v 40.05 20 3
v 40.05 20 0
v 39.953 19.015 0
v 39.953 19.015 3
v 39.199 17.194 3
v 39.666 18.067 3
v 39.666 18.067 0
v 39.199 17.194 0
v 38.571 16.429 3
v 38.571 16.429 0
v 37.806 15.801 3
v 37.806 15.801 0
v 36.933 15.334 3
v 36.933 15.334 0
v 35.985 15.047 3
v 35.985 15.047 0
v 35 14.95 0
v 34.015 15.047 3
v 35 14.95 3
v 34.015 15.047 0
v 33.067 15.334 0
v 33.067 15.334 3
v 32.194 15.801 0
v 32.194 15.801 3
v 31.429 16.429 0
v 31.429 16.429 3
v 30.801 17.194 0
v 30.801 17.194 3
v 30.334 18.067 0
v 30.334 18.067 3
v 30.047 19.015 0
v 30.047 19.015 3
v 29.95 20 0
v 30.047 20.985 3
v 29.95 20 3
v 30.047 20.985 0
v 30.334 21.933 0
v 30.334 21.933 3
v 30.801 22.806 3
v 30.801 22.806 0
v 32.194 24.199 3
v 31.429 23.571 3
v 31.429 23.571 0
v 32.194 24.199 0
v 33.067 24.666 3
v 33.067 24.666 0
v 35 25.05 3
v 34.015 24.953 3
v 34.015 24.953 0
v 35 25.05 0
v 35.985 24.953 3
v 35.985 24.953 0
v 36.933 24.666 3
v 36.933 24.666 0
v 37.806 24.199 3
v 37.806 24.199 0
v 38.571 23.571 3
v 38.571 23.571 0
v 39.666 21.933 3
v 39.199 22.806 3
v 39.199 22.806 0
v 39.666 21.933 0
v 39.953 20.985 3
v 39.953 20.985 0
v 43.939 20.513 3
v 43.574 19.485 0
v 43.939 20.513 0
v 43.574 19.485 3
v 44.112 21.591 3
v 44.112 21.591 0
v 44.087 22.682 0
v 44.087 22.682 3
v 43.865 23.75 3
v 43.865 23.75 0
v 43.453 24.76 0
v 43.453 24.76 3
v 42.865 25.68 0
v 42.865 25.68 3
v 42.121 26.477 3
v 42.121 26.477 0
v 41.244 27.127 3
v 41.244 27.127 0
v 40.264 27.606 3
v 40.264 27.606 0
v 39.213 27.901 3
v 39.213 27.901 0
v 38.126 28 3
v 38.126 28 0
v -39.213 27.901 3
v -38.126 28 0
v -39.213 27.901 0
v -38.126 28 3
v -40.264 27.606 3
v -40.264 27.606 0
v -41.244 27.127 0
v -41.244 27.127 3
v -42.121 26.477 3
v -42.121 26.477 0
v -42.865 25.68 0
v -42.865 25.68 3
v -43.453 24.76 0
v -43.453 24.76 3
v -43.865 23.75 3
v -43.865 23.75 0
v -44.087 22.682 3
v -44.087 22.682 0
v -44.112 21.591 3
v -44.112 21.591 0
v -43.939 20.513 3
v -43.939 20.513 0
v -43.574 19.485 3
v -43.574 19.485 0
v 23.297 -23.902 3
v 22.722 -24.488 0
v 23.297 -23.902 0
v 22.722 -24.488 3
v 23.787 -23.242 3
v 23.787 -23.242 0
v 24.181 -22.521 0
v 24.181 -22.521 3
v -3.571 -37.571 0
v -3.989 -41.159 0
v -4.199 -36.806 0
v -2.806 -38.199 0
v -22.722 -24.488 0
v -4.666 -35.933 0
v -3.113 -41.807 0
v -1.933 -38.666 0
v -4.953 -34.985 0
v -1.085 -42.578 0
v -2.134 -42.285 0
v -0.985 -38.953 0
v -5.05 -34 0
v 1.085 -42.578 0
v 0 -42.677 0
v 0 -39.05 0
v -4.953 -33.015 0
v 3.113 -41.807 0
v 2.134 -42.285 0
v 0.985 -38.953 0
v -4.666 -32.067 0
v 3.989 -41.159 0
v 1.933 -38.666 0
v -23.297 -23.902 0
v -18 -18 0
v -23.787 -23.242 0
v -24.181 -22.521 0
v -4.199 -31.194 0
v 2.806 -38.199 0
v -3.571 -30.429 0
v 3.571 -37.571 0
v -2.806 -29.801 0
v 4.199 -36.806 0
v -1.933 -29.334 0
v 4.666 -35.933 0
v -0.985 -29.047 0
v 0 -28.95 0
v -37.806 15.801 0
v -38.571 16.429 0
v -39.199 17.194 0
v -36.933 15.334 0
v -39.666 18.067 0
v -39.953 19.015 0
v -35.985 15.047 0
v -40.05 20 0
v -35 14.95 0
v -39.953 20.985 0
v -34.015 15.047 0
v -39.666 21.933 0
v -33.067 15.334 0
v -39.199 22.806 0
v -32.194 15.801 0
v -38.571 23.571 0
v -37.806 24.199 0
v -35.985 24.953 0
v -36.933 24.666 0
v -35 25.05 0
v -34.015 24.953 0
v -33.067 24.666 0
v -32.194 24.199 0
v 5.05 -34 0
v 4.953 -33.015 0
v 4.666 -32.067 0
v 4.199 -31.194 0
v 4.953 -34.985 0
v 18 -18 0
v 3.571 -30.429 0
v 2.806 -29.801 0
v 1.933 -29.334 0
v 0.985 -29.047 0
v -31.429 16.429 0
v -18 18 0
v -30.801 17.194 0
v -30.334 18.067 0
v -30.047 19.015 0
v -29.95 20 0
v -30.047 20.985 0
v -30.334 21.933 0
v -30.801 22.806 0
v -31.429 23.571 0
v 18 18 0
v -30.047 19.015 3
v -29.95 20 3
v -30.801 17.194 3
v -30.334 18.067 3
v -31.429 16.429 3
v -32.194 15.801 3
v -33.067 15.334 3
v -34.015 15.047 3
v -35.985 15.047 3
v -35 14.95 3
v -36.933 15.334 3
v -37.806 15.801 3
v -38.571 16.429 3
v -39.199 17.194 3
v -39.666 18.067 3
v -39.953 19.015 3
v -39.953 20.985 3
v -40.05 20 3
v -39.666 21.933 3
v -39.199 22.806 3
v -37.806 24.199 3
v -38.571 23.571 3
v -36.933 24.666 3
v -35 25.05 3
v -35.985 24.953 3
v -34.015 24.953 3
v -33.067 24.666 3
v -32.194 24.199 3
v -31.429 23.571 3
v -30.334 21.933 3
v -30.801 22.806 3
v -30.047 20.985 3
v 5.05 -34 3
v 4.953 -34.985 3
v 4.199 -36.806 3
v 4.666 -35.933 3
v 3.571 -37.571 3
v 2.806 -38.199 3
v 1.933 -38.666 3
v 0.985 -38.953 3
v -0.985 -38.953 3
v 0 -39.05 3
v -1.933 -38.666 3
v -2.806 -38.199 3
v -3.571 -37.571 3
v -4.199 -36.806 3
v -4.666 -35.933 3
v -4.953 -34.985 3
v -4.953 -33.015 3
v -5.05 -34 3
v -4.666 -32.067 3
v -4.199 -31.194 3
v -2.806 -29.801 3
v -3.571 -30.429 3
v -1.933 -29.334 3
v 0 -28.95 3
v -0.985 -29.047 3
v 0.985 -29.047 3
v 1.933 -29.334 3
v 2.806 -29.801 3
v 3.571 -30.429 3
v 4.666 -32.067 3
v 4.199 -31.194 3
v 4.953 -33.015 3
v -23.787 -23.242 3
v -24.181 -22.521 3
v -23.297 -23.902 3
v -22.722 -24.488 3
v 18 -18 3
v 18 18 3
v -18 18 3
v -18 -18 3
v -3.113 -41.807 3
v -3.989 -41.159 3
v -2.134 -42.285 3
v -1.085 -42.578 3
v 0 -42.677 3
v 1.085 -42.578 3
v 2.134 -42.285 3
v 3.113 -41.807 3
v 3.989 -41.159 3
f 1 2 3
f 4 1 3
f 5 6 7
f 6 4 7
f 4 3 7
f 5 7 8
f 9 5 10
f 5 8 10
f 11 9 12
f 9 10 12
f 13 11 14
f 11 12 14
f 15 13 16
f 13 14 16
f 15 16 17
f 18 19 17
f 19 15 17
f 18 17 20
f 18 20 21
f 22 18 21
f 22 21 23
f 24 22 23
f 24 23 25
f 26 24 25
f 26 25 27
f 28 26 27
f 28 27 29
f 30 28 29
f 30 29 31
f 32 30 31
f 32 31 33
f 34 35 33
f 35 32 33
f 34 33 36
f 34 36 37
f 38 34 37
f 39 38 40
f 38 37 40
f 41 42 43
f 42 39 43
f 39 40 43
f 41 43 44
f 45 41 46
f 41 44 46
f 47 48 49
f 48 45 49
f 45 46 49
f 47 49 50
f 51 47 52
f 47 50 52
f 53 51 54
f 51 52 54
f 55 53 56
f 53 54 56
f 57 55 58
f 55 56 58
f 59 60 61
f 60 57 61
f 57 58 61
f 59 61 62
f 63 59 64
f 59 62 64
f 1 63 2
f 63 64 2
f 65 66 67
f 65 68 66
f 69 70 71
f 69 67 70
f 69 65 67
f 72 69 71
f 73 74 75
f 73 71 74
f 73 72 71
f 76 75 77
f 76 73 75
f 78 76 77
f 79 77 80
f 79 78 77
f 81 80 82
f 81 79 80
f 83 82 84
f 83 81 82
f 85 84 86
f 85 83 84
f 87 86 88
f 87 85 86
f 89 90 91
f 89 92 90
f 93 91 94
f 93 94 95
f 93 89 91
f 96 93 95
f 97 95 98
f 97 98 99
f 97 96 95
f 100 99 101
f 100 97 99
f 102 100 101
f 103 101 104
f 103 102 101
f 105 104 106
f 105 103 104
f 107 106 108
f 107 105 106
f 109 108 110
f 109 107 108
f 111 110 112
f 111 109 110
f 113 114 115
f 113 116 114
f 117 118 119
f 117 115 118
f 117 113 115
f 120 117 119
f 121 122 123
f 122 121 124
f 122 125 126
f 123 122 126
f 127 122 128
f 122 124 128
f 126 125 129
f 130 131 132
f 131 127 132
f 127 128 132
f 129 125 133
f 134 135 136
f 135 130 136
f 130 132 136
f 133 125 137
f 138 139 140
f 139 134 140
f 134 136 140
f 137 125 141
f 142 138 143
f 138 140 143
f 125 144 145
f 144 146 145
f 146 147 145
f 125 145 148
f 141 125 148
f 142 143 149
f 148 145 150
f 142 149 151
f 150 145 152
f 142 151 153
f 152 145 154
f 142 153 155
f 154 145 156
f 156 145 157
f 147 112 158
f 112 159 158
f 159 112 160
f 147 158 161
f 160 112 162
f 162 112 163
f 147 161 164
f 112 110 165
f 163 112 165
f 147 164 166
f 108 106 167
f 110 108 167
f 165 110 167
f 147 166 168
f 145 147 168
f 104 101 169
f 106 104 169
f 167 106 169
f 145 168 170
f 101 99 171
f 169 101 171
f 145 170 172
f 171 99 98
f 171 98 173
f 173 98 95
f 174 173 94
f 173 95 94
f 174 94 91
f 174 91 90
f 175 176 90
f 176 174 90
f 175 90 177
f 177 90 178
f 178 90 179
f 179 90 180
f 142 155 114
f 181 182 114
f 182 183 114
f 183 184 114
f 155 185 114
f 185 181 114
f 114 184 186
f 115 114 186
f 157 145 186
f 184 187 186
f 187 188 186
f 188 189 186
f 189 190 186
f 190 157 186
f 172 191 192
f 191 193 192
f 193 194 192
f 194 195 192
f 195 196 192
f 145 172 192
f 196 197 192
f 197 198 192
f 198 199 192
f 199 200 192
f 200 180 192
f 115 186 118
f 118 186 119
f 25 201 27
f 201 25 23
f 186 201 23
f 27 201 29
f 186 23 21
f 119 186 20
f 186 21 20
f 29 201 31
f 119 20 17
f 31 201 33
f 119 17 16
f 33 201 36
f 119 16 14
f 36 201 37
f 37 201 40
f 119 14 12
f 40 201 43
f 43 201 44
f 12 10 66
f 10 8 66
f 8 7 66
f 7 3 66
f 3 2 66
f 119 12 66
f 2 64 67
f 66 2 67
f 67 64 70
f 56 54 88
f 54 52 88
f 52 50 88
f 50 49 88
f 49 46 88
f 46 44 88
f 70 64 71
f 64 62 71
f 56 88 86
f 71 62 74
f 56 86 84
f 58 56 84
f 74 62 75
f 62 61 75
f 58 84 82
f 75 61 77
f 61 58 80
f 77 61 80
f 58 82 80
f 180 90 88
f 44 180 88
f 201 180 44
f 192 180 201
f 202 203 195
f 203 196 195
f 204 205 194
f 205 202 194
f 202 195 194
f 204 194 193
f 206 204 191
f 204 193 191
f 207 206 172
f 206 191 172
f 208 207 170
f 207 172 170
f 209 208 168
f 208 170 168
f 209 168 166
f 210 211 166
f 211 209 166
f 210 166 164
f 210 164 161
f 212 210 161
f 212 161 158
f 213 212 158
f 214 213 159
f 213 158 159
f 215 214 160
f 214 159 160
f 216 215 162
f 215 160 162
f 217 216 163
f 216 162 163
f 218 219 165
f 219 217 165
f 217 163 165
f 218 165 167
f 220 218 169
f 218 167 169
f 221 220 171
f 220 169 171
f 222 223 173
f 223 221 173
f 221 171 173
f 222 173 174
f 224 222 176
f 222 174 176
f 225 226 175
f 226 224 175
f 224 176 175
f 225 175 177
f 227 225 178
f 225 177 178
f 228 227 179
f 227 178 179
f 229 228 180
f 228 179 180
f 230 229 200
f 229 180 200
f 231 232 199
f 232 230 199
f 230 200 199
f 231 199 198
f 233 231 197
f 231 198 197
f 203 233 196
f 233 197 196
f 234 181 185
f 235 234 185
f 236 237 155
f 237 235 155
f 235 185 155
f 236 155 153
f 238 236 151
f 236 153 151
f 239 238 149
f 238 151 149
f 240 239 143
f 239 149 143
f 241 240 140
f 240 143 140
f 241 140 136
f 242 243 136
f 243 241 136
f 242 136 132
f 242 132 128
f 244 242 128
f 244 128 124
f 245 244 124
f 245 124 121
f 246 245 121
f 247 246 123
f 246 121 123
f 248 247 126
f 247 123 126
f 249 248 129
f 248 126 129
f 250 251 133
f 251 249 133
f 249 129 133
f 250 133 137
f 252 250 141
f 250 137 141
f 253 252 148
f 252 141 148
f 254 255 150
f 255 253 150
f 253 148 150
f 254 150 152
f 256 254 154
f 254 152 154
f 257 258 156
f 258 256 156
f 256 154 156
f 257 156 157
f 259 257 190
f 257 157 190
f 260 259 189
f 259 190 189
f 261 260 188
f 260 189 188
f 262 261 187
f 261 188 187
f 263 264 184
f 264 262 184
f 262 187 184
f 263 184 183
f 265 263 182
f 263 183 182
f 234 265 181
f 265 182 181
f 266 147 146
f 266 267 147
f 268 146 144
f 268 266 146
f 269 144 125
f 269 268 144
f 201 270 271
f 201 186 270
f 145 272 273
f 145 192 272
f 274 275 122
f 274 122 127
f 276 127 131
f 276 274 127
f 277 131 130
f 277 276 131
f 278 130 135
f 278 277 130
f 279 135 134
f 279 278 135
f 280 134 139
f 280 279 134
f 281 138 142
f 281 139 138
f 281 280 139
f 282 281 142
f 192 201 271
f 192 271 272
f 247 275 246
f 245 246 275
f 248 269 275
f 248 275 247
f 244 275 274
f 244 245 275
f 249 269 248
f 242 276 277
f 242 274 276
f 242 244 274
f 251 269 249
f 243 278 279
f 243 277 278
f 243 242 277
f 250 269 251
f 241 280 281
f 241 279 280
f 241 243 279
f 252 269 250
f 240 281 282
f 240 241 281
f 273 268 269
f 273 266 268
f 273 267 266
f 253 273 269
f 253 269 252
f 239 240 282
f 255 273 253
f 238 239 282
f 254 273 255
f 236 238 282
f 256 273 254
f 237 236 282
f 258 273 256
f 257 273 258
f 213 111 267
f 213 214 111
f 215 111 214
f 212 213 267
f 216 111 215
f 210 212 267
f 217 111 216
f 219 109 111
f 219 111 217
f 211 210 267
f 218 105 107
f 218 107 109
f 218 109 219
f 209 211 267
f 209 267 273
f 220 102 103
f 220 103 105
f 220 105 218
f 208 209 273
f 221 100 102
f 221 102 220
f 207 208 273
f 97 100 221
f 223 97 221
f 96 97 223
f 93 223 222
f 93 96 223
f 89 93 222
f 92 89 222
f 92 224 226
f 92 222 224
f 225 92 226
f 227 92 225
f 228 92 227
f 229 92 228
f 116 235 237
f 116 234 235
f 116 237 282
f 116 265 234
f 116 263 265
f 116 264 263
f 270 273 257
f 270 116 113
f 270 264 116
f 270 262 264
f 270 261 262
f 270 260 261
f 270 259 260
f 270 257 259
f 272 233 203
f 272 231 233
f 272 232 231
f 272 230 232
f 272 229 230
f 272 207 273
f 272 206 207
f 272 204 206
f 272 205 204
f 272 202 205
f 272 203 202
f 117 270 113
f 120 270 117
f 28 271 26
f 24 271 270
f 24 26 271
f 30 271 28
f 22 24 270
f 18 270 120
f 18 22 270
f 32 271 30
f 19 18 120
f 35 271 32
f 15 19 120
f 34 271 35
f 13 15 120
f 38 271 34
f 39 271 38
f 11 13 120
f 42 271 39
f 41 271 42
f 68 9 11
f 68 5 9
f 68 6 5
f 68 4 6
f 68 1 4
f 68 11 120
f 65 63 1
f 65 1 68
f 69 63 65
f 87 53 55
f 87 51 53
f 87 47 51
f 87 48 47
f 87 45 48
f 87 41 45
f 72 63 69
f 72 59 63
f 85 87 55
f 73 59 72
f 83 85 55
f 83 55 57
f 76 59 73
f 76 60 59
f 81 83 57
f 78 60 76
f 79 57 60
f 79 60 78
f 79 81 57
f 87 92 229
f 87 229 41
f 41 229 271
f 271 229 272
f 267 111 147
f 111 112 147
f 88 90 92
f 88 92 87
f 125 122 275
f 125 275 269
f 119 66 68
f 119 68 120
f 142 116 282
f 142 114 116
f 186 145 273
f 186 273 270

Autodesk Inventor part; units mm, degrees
ref_plane "YZ Plane" through (0, 0, 0) normal (1, 0, 0) x (0, 1, 0)
ref_plane "XZ Plane" through (0, 0, 0) normal (0, 1, 0) x (-1, 0, 0)
ref_plane "XY Plane" through (0, 0, 0) normal (0, 0, 1) x (1, 0, 0)
sketch "Sketch6" plane through (0, 0, 0) normal (0, 0, 1) x (1, 0, 0)
  line L0 (18, 18) -> (-18, 18)
  line L1 (-18, 18) -> (-18, -18)
  line L2 (-18, -18) -> (18, -18)
  line L3 (18, -18) -> (18, 18)
  line L4 (18, 18) -> (-18, -18) construction
  circle A0 centre (0, -34) radius 5.05
  circle A1 centre (35, 20) radius 5.05
  circle A2 centre (-35, 20) radius 5.05
  line L5 (35, 20) -> (-35, 20) construction
  line L6 (-35, 20) -> (0, -34) construction
  line L7 (0, -34) -> (35, 20) construction
  line L8 (0, 18) -> (0, -18) construction
  line L9 (-47.5046, 28) -> (47.5046, 28)
  line L10 (-18, 18) -> (23.6569, -23.6569) construction
  line L11 (18, 18) -> (-23.6569, -23.6569) construction
  line L12 (47.5046, 28) -> (23.6569, -23.6569)
  line L13 (23.6569, -23.6569) -> (0, -44.709)
  line L14 (0, -44.709) -> (-23.6569, -23.6569)
  line L15 (-47.5046, 28) -> (-23.6569, -23.6569)
  line L16 (-35, 20) -> (-42.2633, 16.6468) construction
  line L17 (0, -34) -> (-5.3183, -39.9763) construction
  point P0 (0, 0)
  point P1 (0, 0)
  point P2 (60, 0)
  point P3 (0, 28)
  point P4 (0, 0)
  dimension "d30" = 36
  dimension "d31" = 36
  dimension "d33" = 10.1
  dimension "d37" = 64.3506
  dimension "d52" = 70
  dimension "d53" = 8
  dimension "d54" = 20
  dimension "d57" = 8
  dimension "d59" = 8
  dimension "d60" = 95.0092
  dimension "d61" = 54
  dimension "d62" = 8
  dimension "d63" = 8
  dimension "d64" = 10
extrude "Plate3" add sketch "Sketch6" along normal blind 3
fillet "Corner Round2" radius 6 5 edges at (-47.5046, 28, 1.5) (47.5046, 28, 1.5) (0, -44.709, 1.5) (-23.6569, -23.6569, 1.5) (23.6569, -23.6569, 1.5)
equation "\"d41\" = Thickness"
equation "\"BendReliefWidth\" = Thickness"
equation "\"BendReliefDepth\" = 0.5 * Thickness"
equation "\"CornerReliefSize\" = 4 * Thickness"
equation "\"MinimumRemnant\" = 2 * Thickness"
equation "\"TransitionRadius\" = BendRadius"
equation "\"JacobiRadiusSize\" = BendRadius"
equation "\"GapSize\" = Thickness"
equation "\"Thickness\" = 3"
equation "\"BendRadius\" = 5"
properties part number "DSB-507 beam flange" material "Stainless Steel"
